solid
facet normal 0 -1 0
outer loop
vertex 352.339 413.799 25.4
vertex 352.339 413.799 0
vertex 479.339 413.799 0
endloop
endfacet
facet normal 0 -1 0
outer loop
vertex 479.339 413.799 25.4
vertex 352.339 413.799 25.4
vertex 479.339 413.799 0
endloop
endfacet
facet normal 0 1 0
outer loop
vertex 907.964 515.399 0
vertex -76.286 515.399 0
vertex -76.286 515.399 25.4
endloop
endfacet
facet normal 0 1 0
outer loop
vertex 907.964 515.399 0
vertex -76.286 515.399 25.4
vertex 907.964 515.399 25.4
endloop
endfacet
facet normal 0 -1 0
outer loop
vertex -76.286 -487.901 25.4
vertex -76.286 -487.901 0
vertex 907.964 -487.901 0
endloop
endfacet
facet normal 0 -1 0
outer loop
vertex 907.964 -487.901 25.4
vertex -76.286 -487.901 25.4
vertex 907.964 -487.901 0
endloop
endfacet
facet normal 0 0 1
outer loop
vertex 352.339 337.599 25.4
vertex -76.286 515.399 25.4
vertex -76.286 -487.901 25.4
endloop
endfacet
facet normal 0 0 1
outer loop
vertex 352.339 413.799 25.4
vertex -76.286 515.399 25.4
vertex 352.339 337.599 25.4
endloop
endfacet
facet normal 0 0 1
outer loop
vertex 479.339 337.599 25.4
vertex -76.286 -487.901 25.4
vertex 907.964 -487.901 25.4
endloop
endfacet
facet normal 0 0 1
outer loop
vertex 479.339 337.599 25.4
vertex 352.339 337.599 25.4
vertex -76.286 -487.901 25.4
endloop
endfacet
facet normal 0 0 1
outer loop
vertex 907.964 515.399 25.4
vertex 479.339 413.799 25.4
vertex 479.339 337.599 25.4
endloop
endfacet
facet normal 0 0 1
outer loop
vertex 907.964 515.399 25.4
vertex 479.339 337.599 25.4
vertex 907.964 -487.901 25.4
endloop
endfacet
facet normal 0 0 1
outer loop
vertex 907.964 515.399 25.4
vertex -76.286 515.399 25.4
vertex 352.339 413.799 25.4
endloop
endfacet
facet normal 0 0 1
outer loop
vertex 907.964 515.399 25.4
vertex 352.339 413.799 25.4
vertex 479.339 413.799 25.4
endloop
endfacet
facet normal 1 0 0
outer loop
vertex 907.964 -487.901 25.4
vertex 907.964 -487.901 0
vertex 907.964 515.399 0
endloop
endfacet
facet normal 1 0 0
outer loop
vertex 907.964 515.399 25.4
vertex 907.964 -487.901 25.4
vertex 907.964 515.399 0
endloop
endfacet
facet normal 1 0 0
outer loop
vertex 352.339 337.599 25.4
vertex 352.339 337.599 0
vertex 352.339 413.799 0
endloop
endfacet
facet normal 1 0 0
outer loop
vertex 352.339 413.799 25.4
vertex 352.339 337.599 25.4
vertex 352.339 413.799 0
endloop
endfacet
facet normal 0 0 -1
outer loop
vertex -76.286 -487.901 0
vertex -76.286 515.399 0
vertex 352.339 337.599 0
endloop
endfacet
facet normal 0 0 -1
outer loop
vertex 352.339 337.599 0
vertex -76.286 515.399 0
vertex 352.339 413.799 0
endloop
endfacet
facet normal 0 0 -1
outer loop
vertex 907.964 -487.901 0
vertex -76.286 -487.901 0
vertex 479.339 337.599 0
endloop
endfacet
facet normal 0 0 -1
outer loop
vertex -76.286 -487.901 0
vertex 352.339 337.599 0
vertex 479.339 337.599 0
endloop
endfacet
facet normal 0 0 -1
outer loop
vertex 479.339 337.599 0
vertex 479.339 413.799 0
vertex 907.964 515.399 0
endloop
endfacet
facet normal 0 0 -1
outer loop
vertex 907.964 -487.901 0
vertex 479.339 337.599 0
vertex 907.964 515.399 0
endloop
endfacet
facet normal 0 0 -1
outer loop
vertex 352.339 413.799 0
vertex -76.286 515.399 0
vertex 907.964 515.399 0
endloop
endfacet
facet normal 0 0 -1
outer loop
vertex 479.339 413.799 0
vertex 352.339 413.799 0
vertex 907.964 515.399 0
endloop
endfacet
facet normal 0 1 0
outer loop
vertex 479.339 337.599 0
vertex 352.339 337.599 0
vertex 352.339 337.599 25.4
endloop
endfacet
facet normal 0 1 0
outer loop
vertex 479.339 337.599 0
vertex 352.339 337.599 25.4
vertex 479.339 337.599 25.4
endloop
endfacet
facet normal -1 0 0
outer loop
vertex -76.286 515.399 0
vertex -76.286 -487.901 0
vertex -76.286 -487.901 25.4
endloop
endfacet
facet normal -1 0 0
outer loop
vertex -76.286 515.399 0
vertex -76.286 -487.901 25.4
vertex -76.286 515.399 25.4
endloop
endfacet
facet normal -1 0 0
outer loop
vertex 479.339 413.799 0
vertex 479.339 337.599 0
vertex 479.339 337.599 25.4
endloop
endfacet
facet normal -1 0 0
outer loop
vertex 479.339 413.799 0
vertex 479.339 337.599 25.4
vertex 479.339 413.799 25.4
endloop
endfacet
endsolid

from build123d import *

# Parameters (mm, degrees)
F0_W     = 984.25
F0_H     = 1003.3
F0_W_2   = 127
F0_H_2   = 76.2
F1_DEPTH = 6.35
F2_DEPTH = 25.4
F3_DEPTH = 25.4


with BuildPart() as f1:
    # F0 (on Top) → F1 (new body)
    with BuildSketch(Plane.XY):
        with Locations((415.838617, 13.748734)):
            Rectangle(F0_W, F0_H)
        with Locations((415.838617, 375.698734)):
            Rectangle(F0_W_2, F0_H_2, mode=Mode.SUBTRACT)
    extrude(amount=F1_DEPTH)

    # F0 (on Top) → F2 (join)
    with BuildSketch(Plane.XY):
        with Locations((415.838617, 13.748734)):
            Rectangle(F0_W, F0_H)
        with Locations((415.838617, 375.698734)):
            Rectangle(F0_W_2, F0_H_2, mode=Mode.SUBTRACT)
    extrude(amount=F2_DEPTH)

    # F0 (on Top) → F3 (join)
    with BuildSketch(Plane.XY):
        with Locations((415.838617, 13.748734)):
            Rectangle(F0_W, F0_H)
        with Locations((415.838617, 375.698734)):
            Rectangle(F0_W_2, F0_H_2, mode=Mode.SUBTRACT)
    extrude(amount=F3_DEPTH)


solid = f1.part
